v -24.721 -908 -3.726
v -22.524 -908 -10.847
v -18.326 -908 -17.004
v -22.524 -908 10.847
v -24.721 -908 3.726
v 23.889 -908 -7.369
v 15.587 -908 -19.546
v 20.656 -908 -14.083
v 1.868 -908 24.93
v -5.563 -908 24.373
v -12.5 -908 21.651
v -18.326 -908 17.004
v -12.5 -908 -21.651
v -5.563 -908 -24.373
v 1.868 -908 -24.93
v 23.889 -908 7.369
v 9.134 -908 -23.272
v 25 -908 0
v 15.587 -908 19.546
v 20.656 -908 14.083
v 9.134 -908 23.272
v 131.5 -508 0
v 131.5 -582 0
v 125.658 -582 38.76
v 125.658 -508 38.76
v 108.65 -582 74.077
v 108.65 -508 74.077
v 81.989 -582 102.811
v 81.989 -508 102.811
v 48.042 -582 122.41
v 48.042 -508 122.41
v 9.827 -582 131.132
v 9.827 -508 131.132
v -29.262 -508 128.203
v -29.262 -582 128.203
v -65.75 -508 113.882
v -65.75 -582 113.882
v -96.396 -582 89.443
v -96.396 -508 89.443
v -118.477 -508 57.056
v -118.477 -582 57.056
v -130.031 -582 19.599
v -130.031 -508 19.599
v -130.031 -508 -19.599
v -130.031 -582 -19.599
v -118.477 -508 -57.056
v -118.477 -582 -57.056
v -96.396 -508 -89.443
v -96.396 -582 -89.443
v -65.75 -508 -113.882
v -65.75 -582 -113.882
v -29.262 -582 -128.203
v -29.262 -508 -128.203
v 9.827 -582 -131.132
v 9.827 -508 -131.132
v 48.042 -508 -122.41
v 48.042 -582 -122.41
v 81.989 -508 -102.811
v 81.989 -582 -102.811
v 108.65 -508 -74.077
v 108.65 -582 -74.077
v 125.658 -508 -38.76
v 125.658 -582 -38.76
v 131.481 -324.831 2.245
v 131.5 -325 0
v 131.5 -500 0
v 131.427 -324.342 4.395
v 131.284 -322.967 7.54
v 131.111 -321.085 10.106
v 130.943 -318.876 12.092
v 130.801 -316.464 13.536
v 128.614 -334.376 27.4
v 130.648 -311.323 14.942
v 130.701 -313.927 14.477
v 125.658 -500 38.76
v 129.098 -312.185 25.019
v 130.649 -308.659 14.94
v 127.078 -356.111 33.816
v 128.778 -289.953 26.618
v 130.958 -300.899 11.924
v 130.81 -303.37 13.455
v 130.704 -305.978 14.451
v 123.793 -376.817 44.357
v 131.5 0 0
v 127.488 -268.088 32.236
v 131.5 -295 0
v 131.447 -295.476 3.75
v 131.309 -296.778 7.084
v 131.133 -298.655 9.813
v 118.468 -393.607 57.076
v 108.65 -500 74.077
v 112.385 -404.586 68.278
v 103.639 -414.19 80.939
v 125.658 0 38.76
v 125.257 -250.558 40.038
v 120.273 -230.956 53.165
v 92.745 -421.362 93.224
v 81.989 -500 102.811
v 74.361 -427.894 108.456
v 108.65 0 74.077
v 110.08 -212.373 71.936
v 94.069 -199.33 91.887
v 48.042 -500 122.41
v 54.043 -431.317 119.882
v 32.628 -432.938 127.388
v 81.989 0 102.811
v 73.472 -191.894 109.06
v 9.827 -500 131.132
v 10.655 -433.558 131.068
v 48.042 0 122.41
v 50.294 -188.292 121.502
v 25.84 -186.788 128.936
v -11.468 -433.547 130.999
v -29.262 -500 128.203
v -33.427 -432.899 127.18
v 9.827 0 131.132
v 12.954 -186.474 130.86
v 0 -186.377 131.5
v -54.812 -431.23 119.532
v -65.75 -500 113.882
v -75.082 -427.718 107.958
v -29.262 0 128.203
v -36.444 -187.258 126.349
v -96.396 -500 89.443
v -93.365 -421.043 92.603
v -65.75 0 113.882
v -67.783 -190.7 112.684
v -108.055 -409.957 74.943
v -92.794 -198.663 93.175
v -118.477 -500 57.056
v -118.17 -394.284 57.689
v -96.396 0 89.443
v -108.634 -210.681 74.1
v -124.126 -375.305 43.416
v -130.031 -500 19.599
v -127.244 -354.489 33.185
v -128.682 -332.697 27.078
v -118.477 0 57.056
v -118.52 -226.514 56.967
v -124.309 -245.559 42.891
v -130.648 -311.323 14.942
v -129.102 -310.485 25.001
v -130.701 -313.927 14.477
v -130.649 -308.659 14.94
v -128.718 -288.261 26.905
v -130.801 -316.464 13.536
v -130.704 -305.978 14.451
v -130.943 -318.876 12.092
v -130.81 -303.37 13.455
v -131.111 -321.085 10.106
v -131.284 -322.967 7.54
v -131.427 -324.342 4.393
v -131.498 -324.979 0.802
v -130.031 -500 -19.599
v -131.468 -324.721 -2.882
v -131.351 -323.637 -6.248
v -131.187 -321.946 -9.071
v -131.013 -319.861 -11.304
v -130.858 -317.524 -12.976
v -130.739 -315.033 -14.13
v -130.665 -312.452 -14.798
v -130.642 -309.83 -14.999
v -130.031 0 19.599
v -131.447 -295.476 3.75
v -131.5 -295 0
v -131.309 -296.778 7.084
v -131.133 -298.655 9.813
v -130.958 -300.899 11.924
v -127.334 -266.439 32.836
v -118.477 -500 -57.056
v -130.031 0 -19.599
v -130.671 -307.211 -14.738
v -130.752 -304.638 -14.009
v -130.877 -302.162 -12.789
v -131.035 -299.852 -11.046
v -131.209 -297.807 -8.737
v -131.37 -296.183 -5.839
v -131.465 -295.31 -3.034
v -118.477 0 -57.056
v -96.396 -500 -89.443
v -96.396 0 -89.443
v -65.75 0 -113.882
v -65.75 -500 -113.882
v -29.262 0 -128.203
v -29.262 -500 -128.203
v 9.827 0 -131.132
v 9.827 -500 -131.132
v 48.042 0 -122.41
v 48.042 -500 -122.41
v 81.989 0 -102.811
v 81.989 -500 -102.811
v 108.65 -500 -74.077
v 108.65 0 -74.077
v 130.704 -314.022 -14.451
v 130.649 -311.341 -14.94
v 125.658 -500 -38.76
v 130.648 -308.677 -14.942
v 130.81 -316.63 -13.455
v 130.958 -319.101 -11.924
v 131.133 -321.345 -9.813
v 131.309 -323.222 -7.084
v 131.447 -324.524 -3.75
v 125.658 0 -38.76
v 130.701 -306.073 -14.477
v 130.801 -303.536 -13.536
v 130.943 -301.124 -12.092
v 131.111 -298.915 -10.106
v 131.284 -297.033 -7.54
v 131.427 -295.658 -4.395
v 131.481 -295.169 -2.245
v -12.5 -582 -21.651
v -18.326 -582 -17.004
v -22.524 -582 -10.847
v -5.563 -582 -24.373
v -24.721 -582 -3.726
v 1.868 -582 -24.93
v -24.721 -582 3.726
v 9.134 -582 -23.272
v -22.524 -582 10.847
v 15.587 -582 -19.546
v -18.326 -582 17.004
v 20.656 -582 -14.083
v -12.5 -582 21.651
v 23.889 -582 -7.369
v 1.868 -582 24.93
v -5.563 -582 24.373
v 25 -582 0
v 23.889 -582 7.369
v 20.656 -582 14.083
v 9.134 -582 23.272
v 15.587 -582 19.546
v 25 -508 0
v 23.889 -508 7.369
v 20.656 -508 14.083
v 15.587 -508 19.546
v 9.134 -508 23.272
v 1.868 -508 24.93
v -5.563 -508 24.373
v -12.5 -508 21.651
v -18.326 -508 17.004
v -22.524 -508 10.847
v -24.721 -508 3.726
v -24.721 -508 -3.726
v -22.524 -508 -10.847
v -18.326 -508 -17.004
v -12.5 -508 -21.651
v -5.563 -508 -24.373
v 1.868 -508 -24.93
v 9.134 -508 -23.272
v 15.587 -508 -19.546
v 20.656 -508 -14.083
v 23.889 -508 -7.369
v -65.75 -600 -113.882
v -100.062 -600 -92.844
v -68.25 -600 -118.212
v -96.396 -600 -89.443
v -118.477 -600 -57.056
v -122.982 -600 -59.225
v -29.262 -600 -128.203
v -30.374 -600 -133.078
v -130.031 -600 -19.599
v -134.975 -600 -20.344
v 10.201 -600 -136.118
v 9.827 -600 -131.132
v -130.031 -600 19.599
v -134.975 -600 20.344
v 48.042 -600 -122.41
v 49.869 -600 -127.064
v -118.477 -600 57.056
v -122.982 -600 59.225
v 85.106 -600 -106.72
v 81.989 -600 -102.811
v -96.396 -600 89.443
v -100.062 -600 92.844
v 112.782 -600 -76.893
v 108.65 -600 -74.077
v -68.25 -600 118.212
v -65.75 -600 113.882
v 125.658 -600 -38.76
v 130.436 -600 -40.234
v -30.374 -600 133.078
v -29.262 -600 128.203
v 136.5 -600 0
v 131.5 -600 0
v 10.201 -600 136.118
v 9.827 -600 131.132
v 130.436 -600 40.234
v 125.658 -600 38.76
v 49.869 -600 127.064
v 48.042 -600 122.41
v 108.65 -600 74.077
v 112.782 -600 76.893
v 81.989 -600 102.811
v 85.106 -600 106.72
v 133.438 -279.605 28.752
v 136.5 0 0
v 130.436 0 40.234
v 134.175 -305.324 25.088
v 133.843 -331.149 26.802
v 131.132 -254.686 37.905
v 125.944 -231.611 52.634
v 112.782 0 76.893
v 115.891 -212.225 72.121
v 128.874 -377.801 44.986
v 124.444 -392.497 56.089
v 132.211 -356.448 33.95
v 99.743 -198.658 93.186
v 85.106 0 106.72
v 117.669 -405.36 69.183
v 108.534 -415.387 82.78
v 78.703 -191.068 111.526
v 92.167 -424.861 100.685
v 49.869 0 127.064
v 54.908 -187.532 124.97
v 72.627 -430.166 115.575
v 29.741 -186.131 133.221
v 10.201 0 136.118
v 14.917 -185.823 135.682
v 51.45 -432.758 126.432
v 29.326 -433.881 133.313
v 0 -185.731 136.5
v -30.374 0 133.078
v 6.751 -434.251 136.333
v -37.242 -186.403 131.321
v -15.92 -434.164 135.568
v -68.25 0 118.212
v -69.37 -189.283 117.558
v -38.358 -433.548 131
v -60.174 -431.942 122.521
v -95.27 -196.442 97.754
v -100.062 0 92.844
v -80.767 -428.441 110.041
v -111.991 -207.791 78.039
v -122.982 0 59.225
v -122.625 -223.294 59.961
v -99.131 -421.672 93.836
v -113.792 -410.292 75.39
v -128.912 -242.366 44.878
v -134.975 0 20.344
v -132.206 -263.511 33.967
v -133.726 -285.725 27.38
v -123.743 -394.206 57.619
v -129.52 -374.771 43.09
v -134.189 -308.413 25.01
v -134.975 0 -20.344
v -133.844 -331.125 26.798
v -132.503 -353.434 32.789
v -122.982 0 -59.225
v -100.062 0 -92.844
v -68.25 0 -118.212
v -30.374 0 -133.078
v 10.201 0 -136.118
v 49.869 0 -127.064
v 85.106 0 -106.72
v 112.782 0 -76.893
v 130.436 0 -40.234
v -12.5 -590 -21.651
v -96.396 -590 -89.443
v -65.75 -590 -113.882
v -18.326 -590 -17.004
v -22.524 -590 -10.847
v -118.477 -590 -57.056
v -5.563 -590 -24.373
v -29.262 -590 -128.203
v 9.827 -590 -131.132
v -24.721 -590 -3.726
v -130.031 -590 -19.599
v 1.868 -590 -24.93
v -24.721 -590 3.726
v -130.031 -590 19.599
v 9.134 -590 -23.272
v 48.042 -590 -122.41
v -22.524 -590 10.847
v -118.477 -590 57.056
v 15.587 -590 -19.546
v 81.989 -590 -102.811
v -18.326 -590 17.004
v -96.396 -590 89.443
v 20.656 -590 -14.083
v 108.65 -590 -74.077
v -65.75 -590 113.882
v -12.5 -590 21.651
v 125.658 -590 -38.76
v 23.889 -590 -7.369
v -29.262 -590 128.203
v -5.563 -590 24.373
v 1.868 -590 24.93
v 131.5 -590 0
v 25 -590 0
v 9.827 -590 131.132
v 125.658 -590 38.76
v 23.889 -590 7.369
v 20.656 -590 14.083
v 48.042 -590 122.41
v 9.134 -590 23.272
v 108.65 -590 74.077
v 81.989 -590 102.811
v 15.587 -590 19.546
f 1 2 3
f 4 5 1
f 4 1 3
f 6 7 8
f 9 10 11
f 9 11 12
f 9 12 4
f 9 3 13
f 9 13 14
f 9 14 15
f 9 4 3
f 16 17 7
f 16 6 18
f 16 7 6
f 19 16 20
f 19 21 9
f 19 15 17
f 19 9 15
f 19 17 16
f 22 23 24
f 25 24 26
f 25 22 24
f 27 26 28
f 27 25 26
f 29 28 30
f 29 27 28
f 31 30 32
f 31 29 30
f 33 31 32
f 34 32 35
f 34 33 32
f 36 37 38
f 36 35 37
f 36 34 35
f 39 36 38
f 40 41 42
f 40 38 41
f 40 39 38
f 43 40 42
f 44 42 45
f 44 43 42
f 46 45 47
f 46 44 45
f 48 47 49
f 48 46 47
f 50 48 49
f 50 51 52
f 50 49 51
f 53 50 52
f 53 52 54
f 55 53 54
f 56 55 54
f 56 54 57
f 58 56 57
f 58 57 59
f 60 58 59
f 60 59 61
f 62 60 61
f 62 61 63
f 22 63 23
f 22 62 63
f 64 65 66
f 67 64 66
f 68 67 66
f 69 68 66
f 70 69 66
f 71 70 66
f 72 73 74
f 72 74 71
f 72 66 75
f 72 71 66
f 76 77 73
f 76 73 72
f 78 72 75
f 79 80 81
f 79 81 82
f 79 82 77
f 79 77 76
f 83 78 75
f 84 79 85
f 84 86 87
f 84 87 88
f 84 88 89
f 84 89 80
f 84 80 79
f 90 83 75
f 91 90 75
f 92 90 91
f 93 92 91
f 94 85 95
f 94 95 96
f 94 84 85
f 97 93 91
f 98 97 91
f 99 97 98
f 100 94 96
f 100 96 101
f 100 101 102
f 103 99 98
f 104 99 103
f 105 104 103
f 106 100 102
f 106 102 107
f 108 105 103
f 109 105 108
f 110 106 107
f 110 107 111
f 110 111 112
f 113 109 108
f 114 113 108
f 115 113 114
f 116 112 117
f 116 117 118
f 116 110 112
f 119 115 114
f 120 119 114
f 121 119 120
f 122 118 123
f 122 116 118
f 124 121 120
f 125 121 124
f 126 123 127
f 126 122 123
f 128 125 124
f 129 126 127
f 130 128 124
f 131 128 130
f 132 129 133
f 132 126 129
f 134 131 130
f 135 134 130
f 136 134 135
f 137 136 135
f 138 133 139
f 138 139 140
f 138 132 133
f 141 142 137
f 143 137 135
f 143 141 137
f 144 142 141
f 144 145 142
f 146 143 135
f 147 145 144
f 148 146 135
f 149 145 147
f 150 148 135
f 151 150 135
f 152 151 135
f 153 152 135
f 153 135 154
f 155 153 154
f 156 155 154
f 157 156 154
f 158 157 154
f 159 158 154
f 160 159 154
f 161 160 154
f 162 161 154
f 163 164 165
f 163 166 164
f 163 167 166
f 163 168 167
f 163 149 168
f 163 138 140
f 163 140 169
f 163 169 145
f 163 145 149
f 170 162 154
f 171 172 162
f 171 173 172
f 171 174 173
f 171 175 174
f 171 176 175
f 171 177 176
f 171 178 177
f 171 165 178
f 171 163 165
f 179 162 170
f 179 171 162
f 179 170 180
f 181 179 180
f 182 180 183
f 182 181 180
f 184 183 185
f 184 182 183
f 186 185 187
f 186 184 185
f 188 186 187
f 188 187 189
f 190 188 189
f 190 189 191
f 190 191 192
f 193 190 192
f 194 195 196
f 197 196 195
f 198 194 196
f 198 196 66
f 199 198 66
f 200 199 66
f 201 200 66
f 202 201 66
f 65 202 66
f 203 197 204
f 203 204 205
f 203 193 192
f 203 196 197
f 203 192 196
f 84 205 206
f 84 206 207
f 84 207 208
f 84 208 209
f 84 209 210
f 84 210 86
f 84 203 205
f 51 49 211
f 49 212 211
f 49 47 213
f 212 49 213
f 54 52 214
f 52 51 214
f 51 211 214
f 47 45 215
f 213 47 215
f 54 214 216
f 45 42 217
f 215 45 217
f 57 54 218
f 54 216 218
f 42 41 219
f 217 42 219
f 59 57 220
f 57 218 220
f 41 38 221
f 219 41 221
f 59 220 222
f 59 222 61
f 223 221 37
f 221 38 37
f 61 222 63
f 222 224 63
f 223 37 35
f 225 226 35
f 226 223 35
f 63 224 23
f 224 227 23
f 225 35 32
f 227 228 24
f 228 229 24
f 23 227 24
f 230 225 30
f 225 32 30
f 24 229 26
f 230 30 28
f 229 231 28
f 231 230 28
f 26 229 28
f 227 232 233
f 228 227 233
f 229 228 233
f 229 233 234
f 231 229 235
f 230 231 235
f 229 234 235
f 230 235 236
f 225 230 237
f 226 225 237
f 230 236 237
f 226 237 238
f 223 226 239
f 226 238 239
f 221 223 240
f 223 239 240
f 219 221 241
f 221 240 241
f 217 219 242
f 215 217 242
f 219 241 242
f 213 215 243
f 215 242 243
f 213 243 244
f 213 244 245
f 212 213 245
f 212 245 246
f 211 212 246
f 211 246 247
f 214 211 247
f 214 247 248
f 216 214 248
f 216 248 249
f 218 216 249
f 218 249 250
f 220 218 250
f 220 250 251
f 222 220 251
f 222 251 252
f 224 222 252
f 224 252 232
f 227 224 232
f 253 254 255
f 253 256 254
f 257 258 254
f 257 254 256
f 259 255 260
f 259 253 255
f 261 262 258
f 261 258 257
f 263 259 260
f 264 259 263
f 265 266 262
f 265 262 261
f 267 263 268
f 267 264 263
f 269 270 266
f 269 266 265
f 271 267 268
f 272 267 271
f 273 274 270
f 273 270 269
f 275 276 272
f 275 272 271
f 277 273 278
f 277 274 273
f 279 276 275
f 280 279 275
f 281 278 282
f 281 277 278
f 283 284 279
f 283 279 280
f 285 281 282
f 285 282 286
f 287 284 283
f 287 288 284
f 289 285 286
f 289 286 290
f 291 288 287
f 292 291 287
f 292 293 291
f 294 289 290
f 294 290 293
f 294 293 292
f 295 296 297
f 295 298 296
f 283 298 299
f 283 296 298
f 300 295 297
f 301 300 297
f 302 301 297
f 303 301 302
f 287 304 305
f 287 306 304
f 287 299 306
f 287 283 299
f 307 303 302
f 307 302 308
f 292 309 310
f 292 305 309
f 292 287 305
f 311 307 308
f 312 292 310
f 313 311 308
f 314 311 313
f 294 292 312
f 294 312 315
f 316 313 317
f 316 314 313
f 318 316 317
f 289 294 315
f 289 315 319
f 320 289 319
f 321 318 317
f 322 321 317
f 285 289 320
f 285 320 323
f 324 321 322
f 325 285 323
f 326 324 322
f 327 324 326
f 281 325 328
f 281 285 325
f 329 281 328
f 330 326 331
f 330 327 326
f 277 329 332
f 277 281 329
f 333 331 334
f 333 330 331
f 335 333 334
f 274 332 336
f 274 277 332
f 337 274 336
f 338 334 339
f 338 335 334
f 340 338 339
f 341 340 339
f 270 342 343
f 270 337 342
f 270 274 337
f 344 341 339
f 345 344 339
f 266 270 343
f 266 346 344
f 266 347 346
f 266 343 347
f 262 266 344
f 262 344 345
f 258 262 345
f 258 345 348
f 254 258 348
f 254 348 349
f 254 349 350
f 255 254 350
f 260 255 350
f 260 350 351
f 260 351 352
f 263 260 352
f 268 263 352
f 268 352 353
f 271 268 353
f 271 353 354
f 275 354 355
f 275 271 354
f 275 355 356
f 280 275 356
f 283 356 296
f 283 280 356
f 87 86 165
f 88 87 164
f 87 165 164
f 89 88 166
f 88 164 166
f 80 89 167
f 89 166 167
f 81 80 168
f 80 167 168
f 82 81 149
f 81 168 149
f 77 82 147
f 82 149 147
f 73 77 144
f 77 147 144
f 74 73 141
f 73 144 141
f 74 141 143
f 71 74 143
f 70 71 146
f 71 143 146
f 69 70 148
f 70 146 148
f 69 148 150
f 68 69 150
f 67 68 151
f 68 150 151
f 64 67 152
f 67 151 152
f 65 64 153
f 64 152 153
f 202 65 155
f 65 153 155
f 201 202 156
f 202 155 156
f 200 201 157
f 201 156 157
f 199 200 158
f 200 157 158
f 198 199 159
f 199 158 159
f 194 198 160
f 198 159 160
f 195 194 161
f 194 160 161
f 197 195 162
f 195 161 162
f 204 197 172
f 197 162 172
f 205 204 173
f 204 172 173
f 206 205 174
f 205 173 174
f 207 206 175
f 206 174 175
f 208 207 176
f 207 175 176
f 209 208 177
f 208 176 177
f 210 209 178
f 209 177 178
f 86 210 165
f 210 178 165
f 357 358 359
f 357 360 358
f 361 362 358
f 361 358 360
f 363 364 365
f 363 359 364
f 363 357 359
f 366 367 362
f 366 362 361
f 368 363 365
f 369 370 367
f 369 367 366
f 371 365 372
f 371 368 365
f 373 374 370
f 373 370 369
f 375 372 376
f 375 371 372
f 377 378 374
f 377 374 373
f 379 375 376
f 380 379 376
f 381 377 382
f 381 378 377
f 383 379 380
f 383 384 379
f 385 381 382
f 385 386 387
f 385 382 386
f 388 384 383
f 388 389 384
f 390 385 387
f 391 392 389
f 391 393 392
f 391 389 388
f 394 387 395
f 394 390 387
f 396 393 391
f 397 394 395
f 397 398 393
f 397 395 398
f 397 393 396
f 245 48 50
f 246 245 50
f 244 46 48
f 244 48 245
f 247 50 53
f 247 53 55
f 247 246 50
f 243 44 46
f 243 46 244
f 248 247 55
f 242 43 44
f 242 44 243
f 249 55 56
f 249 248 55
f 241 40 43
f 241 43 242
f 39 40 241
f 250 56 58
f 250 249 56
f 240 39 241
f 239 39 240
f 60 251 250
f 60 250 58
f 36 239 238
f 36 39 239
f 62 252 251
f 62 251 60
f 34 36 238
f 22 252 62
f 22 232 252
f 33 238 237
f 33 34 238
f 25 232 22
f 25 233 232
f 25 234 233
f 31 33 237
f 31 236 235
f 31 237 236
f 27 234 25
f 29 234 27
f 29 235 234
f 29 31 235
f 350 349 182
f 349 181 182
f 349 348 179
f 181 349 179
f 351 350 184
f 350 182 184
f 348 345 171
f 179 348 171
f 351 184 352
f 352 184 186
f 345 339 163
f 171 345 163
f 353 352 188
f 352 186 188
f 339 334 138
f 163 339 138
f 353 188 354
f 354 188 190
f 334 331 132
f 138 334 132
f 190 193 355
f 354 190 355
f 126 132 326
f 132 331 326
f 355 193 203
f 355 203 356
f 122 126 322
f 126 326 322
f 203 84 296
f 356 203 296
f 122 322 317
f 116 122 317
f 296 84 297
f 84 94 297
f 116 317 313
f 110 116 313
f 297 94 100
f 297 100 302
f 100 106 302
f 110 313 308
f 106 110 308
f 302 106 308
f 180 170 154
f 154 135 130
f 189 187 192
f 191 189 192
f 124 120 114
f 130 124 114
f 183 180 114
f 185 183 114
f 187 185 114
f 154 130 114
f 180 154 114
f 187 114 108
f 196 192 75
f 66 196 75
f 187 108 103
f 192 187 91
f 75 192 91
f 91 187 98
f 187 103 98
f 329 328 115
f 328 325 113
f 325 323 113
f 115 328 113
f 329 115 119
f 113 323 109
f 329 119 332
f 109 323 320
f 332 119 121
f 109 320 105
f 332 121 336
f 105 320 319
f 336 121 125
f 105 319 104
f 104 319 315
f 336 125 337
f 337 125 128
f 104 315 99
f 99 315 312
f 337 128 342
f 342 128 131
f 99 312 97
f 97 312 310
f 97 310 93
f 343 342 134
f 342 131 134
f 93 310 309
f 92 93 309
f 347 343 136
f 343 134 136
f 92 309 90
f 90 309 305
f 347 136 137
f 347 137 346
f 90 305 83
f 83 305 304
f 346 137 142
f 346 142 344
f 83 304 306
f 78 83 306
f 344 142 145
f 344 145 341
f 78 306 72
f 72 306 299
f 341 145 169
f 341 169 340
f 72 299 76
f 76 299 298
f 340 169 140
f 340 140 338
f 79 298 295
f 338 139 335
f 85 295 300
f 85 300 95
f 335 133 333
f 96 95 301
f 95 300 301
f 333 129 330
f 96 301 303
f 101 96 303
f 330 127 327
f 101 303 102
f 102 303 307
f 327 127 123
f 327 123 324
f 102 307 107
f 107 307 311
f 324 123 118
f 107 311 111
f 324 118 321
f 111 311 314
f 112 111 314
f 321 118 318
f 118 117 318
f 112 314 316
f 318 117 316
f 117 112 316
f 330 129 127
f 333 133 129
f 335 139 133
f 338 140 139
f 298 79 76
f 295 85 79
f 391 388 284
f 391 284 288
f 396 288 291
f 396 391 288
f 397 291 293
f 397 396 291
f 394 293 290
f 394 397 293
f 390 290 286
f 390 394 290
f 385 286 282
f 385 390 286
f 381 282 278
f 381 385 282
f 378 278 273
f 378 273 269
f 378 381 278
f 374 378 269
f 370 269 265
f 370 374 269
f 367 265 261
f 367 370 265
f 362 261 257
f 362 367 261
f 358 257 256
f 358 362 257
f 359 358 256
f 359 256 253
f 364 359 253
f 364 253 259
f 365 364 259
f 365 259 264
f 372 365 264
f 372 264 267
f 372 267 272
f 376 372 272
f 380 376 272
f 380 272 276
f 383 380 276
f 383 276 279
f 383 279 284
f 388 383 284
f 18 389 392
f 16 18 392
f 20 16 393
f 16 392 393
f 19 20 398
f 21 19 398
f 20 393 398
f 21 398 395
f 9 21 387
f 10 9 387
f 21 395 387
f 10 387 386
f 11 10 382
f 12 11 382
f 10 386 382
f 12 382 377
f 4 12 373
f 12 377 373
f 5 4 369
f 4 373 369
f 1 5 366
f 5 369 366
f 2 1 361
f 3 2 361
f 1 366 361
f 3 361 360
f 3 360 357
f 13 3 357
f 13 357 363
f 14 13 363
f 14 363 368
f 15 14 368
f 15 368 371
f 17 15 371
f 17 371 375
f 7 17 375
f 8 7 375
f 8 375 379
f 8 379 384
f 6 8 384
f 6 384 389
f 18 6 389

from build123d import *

# Parameters (mm, degrees)
F0_R      = 136.5
F0_R_2    = 131.5
F1_DEPTH  = 600
F3_R      = 131.5
F4_DEPTH  = 8
F5_R      = 25
F6_DEPTH  = 400
F7_R      = 15
F8_DEPTH  = 154
F9_DEPTH  = 149
F10_R     = 125
F11_DEPTH = 348
F12_R     = 175
F12_R_2   = 136.5
F13_DEPTH = 1133
F15_R     = 136.5
F15_R_2   = 25
F16_DEPTH = 8


with BuildPart() as f1:
    # F0 (on Front) → F1 (new body)
    with BuildSketch(Plane.XZ):
        Circle(F0_R)
        Circle(F0_R_2, mode=Mode.SUBTRACT)
    extrude(amount=F1_DEPTH)

    # F3 (on offset) → F4 (join)
    with BuildSketch(Plane.XZ.offset(500)):
        Circle(F3_R)
    extrude(amount=F4_DEPTH)

    # F5 (on face) → F6 (join)
    with BuildSketch(Plane.XZ.offset(508)):
        Circle(F5_R)
    extrude(amount=F6_DEPTH)

    # F7 (on Right) → F8 (join)
    with BuildSketch(Plane.YZ):
        with Locations((-310, 0)):
            Circle(F7_R)
    extrude(amount=F8_DEPTH)

    # F7 (on Right) → F9 (join)
    with BuildSketch(Plane.YZ):
        with Locations((-310, 0)):
            Circle(F7_R)
    extrude(amount=-F9_DEPTH)

    # F10 (on face) → F11 (cut)
    with BuildSketch(Plane.YZ.offset(154)):
        with Locations((-310, 150)):
            Circle(F10_R)
    extrude(amount=-F11_DEPTH, mode=Mode.SUBTRACT)

    # F12 (on face) → F13 (cut)
    with BuildSketch(Plane.XZ.offset(908)):
        Circle(F12_R)
        Circle(F12_R_2, mode=Mode.SUBTRACT)
    extrude(amount=-F13_DEPTH, mode=Mode.SUBTRACT)

    # F15 (on offset) → F16 (join)
    with BuildSketch(Plane.XZ.offset(590)):
        Circle(F15_R)
        Circle(F15_R_2, mode=Mode.SUBTRACT)
    extrude(amount=-F16_DEPTH)


solid = f1.part
